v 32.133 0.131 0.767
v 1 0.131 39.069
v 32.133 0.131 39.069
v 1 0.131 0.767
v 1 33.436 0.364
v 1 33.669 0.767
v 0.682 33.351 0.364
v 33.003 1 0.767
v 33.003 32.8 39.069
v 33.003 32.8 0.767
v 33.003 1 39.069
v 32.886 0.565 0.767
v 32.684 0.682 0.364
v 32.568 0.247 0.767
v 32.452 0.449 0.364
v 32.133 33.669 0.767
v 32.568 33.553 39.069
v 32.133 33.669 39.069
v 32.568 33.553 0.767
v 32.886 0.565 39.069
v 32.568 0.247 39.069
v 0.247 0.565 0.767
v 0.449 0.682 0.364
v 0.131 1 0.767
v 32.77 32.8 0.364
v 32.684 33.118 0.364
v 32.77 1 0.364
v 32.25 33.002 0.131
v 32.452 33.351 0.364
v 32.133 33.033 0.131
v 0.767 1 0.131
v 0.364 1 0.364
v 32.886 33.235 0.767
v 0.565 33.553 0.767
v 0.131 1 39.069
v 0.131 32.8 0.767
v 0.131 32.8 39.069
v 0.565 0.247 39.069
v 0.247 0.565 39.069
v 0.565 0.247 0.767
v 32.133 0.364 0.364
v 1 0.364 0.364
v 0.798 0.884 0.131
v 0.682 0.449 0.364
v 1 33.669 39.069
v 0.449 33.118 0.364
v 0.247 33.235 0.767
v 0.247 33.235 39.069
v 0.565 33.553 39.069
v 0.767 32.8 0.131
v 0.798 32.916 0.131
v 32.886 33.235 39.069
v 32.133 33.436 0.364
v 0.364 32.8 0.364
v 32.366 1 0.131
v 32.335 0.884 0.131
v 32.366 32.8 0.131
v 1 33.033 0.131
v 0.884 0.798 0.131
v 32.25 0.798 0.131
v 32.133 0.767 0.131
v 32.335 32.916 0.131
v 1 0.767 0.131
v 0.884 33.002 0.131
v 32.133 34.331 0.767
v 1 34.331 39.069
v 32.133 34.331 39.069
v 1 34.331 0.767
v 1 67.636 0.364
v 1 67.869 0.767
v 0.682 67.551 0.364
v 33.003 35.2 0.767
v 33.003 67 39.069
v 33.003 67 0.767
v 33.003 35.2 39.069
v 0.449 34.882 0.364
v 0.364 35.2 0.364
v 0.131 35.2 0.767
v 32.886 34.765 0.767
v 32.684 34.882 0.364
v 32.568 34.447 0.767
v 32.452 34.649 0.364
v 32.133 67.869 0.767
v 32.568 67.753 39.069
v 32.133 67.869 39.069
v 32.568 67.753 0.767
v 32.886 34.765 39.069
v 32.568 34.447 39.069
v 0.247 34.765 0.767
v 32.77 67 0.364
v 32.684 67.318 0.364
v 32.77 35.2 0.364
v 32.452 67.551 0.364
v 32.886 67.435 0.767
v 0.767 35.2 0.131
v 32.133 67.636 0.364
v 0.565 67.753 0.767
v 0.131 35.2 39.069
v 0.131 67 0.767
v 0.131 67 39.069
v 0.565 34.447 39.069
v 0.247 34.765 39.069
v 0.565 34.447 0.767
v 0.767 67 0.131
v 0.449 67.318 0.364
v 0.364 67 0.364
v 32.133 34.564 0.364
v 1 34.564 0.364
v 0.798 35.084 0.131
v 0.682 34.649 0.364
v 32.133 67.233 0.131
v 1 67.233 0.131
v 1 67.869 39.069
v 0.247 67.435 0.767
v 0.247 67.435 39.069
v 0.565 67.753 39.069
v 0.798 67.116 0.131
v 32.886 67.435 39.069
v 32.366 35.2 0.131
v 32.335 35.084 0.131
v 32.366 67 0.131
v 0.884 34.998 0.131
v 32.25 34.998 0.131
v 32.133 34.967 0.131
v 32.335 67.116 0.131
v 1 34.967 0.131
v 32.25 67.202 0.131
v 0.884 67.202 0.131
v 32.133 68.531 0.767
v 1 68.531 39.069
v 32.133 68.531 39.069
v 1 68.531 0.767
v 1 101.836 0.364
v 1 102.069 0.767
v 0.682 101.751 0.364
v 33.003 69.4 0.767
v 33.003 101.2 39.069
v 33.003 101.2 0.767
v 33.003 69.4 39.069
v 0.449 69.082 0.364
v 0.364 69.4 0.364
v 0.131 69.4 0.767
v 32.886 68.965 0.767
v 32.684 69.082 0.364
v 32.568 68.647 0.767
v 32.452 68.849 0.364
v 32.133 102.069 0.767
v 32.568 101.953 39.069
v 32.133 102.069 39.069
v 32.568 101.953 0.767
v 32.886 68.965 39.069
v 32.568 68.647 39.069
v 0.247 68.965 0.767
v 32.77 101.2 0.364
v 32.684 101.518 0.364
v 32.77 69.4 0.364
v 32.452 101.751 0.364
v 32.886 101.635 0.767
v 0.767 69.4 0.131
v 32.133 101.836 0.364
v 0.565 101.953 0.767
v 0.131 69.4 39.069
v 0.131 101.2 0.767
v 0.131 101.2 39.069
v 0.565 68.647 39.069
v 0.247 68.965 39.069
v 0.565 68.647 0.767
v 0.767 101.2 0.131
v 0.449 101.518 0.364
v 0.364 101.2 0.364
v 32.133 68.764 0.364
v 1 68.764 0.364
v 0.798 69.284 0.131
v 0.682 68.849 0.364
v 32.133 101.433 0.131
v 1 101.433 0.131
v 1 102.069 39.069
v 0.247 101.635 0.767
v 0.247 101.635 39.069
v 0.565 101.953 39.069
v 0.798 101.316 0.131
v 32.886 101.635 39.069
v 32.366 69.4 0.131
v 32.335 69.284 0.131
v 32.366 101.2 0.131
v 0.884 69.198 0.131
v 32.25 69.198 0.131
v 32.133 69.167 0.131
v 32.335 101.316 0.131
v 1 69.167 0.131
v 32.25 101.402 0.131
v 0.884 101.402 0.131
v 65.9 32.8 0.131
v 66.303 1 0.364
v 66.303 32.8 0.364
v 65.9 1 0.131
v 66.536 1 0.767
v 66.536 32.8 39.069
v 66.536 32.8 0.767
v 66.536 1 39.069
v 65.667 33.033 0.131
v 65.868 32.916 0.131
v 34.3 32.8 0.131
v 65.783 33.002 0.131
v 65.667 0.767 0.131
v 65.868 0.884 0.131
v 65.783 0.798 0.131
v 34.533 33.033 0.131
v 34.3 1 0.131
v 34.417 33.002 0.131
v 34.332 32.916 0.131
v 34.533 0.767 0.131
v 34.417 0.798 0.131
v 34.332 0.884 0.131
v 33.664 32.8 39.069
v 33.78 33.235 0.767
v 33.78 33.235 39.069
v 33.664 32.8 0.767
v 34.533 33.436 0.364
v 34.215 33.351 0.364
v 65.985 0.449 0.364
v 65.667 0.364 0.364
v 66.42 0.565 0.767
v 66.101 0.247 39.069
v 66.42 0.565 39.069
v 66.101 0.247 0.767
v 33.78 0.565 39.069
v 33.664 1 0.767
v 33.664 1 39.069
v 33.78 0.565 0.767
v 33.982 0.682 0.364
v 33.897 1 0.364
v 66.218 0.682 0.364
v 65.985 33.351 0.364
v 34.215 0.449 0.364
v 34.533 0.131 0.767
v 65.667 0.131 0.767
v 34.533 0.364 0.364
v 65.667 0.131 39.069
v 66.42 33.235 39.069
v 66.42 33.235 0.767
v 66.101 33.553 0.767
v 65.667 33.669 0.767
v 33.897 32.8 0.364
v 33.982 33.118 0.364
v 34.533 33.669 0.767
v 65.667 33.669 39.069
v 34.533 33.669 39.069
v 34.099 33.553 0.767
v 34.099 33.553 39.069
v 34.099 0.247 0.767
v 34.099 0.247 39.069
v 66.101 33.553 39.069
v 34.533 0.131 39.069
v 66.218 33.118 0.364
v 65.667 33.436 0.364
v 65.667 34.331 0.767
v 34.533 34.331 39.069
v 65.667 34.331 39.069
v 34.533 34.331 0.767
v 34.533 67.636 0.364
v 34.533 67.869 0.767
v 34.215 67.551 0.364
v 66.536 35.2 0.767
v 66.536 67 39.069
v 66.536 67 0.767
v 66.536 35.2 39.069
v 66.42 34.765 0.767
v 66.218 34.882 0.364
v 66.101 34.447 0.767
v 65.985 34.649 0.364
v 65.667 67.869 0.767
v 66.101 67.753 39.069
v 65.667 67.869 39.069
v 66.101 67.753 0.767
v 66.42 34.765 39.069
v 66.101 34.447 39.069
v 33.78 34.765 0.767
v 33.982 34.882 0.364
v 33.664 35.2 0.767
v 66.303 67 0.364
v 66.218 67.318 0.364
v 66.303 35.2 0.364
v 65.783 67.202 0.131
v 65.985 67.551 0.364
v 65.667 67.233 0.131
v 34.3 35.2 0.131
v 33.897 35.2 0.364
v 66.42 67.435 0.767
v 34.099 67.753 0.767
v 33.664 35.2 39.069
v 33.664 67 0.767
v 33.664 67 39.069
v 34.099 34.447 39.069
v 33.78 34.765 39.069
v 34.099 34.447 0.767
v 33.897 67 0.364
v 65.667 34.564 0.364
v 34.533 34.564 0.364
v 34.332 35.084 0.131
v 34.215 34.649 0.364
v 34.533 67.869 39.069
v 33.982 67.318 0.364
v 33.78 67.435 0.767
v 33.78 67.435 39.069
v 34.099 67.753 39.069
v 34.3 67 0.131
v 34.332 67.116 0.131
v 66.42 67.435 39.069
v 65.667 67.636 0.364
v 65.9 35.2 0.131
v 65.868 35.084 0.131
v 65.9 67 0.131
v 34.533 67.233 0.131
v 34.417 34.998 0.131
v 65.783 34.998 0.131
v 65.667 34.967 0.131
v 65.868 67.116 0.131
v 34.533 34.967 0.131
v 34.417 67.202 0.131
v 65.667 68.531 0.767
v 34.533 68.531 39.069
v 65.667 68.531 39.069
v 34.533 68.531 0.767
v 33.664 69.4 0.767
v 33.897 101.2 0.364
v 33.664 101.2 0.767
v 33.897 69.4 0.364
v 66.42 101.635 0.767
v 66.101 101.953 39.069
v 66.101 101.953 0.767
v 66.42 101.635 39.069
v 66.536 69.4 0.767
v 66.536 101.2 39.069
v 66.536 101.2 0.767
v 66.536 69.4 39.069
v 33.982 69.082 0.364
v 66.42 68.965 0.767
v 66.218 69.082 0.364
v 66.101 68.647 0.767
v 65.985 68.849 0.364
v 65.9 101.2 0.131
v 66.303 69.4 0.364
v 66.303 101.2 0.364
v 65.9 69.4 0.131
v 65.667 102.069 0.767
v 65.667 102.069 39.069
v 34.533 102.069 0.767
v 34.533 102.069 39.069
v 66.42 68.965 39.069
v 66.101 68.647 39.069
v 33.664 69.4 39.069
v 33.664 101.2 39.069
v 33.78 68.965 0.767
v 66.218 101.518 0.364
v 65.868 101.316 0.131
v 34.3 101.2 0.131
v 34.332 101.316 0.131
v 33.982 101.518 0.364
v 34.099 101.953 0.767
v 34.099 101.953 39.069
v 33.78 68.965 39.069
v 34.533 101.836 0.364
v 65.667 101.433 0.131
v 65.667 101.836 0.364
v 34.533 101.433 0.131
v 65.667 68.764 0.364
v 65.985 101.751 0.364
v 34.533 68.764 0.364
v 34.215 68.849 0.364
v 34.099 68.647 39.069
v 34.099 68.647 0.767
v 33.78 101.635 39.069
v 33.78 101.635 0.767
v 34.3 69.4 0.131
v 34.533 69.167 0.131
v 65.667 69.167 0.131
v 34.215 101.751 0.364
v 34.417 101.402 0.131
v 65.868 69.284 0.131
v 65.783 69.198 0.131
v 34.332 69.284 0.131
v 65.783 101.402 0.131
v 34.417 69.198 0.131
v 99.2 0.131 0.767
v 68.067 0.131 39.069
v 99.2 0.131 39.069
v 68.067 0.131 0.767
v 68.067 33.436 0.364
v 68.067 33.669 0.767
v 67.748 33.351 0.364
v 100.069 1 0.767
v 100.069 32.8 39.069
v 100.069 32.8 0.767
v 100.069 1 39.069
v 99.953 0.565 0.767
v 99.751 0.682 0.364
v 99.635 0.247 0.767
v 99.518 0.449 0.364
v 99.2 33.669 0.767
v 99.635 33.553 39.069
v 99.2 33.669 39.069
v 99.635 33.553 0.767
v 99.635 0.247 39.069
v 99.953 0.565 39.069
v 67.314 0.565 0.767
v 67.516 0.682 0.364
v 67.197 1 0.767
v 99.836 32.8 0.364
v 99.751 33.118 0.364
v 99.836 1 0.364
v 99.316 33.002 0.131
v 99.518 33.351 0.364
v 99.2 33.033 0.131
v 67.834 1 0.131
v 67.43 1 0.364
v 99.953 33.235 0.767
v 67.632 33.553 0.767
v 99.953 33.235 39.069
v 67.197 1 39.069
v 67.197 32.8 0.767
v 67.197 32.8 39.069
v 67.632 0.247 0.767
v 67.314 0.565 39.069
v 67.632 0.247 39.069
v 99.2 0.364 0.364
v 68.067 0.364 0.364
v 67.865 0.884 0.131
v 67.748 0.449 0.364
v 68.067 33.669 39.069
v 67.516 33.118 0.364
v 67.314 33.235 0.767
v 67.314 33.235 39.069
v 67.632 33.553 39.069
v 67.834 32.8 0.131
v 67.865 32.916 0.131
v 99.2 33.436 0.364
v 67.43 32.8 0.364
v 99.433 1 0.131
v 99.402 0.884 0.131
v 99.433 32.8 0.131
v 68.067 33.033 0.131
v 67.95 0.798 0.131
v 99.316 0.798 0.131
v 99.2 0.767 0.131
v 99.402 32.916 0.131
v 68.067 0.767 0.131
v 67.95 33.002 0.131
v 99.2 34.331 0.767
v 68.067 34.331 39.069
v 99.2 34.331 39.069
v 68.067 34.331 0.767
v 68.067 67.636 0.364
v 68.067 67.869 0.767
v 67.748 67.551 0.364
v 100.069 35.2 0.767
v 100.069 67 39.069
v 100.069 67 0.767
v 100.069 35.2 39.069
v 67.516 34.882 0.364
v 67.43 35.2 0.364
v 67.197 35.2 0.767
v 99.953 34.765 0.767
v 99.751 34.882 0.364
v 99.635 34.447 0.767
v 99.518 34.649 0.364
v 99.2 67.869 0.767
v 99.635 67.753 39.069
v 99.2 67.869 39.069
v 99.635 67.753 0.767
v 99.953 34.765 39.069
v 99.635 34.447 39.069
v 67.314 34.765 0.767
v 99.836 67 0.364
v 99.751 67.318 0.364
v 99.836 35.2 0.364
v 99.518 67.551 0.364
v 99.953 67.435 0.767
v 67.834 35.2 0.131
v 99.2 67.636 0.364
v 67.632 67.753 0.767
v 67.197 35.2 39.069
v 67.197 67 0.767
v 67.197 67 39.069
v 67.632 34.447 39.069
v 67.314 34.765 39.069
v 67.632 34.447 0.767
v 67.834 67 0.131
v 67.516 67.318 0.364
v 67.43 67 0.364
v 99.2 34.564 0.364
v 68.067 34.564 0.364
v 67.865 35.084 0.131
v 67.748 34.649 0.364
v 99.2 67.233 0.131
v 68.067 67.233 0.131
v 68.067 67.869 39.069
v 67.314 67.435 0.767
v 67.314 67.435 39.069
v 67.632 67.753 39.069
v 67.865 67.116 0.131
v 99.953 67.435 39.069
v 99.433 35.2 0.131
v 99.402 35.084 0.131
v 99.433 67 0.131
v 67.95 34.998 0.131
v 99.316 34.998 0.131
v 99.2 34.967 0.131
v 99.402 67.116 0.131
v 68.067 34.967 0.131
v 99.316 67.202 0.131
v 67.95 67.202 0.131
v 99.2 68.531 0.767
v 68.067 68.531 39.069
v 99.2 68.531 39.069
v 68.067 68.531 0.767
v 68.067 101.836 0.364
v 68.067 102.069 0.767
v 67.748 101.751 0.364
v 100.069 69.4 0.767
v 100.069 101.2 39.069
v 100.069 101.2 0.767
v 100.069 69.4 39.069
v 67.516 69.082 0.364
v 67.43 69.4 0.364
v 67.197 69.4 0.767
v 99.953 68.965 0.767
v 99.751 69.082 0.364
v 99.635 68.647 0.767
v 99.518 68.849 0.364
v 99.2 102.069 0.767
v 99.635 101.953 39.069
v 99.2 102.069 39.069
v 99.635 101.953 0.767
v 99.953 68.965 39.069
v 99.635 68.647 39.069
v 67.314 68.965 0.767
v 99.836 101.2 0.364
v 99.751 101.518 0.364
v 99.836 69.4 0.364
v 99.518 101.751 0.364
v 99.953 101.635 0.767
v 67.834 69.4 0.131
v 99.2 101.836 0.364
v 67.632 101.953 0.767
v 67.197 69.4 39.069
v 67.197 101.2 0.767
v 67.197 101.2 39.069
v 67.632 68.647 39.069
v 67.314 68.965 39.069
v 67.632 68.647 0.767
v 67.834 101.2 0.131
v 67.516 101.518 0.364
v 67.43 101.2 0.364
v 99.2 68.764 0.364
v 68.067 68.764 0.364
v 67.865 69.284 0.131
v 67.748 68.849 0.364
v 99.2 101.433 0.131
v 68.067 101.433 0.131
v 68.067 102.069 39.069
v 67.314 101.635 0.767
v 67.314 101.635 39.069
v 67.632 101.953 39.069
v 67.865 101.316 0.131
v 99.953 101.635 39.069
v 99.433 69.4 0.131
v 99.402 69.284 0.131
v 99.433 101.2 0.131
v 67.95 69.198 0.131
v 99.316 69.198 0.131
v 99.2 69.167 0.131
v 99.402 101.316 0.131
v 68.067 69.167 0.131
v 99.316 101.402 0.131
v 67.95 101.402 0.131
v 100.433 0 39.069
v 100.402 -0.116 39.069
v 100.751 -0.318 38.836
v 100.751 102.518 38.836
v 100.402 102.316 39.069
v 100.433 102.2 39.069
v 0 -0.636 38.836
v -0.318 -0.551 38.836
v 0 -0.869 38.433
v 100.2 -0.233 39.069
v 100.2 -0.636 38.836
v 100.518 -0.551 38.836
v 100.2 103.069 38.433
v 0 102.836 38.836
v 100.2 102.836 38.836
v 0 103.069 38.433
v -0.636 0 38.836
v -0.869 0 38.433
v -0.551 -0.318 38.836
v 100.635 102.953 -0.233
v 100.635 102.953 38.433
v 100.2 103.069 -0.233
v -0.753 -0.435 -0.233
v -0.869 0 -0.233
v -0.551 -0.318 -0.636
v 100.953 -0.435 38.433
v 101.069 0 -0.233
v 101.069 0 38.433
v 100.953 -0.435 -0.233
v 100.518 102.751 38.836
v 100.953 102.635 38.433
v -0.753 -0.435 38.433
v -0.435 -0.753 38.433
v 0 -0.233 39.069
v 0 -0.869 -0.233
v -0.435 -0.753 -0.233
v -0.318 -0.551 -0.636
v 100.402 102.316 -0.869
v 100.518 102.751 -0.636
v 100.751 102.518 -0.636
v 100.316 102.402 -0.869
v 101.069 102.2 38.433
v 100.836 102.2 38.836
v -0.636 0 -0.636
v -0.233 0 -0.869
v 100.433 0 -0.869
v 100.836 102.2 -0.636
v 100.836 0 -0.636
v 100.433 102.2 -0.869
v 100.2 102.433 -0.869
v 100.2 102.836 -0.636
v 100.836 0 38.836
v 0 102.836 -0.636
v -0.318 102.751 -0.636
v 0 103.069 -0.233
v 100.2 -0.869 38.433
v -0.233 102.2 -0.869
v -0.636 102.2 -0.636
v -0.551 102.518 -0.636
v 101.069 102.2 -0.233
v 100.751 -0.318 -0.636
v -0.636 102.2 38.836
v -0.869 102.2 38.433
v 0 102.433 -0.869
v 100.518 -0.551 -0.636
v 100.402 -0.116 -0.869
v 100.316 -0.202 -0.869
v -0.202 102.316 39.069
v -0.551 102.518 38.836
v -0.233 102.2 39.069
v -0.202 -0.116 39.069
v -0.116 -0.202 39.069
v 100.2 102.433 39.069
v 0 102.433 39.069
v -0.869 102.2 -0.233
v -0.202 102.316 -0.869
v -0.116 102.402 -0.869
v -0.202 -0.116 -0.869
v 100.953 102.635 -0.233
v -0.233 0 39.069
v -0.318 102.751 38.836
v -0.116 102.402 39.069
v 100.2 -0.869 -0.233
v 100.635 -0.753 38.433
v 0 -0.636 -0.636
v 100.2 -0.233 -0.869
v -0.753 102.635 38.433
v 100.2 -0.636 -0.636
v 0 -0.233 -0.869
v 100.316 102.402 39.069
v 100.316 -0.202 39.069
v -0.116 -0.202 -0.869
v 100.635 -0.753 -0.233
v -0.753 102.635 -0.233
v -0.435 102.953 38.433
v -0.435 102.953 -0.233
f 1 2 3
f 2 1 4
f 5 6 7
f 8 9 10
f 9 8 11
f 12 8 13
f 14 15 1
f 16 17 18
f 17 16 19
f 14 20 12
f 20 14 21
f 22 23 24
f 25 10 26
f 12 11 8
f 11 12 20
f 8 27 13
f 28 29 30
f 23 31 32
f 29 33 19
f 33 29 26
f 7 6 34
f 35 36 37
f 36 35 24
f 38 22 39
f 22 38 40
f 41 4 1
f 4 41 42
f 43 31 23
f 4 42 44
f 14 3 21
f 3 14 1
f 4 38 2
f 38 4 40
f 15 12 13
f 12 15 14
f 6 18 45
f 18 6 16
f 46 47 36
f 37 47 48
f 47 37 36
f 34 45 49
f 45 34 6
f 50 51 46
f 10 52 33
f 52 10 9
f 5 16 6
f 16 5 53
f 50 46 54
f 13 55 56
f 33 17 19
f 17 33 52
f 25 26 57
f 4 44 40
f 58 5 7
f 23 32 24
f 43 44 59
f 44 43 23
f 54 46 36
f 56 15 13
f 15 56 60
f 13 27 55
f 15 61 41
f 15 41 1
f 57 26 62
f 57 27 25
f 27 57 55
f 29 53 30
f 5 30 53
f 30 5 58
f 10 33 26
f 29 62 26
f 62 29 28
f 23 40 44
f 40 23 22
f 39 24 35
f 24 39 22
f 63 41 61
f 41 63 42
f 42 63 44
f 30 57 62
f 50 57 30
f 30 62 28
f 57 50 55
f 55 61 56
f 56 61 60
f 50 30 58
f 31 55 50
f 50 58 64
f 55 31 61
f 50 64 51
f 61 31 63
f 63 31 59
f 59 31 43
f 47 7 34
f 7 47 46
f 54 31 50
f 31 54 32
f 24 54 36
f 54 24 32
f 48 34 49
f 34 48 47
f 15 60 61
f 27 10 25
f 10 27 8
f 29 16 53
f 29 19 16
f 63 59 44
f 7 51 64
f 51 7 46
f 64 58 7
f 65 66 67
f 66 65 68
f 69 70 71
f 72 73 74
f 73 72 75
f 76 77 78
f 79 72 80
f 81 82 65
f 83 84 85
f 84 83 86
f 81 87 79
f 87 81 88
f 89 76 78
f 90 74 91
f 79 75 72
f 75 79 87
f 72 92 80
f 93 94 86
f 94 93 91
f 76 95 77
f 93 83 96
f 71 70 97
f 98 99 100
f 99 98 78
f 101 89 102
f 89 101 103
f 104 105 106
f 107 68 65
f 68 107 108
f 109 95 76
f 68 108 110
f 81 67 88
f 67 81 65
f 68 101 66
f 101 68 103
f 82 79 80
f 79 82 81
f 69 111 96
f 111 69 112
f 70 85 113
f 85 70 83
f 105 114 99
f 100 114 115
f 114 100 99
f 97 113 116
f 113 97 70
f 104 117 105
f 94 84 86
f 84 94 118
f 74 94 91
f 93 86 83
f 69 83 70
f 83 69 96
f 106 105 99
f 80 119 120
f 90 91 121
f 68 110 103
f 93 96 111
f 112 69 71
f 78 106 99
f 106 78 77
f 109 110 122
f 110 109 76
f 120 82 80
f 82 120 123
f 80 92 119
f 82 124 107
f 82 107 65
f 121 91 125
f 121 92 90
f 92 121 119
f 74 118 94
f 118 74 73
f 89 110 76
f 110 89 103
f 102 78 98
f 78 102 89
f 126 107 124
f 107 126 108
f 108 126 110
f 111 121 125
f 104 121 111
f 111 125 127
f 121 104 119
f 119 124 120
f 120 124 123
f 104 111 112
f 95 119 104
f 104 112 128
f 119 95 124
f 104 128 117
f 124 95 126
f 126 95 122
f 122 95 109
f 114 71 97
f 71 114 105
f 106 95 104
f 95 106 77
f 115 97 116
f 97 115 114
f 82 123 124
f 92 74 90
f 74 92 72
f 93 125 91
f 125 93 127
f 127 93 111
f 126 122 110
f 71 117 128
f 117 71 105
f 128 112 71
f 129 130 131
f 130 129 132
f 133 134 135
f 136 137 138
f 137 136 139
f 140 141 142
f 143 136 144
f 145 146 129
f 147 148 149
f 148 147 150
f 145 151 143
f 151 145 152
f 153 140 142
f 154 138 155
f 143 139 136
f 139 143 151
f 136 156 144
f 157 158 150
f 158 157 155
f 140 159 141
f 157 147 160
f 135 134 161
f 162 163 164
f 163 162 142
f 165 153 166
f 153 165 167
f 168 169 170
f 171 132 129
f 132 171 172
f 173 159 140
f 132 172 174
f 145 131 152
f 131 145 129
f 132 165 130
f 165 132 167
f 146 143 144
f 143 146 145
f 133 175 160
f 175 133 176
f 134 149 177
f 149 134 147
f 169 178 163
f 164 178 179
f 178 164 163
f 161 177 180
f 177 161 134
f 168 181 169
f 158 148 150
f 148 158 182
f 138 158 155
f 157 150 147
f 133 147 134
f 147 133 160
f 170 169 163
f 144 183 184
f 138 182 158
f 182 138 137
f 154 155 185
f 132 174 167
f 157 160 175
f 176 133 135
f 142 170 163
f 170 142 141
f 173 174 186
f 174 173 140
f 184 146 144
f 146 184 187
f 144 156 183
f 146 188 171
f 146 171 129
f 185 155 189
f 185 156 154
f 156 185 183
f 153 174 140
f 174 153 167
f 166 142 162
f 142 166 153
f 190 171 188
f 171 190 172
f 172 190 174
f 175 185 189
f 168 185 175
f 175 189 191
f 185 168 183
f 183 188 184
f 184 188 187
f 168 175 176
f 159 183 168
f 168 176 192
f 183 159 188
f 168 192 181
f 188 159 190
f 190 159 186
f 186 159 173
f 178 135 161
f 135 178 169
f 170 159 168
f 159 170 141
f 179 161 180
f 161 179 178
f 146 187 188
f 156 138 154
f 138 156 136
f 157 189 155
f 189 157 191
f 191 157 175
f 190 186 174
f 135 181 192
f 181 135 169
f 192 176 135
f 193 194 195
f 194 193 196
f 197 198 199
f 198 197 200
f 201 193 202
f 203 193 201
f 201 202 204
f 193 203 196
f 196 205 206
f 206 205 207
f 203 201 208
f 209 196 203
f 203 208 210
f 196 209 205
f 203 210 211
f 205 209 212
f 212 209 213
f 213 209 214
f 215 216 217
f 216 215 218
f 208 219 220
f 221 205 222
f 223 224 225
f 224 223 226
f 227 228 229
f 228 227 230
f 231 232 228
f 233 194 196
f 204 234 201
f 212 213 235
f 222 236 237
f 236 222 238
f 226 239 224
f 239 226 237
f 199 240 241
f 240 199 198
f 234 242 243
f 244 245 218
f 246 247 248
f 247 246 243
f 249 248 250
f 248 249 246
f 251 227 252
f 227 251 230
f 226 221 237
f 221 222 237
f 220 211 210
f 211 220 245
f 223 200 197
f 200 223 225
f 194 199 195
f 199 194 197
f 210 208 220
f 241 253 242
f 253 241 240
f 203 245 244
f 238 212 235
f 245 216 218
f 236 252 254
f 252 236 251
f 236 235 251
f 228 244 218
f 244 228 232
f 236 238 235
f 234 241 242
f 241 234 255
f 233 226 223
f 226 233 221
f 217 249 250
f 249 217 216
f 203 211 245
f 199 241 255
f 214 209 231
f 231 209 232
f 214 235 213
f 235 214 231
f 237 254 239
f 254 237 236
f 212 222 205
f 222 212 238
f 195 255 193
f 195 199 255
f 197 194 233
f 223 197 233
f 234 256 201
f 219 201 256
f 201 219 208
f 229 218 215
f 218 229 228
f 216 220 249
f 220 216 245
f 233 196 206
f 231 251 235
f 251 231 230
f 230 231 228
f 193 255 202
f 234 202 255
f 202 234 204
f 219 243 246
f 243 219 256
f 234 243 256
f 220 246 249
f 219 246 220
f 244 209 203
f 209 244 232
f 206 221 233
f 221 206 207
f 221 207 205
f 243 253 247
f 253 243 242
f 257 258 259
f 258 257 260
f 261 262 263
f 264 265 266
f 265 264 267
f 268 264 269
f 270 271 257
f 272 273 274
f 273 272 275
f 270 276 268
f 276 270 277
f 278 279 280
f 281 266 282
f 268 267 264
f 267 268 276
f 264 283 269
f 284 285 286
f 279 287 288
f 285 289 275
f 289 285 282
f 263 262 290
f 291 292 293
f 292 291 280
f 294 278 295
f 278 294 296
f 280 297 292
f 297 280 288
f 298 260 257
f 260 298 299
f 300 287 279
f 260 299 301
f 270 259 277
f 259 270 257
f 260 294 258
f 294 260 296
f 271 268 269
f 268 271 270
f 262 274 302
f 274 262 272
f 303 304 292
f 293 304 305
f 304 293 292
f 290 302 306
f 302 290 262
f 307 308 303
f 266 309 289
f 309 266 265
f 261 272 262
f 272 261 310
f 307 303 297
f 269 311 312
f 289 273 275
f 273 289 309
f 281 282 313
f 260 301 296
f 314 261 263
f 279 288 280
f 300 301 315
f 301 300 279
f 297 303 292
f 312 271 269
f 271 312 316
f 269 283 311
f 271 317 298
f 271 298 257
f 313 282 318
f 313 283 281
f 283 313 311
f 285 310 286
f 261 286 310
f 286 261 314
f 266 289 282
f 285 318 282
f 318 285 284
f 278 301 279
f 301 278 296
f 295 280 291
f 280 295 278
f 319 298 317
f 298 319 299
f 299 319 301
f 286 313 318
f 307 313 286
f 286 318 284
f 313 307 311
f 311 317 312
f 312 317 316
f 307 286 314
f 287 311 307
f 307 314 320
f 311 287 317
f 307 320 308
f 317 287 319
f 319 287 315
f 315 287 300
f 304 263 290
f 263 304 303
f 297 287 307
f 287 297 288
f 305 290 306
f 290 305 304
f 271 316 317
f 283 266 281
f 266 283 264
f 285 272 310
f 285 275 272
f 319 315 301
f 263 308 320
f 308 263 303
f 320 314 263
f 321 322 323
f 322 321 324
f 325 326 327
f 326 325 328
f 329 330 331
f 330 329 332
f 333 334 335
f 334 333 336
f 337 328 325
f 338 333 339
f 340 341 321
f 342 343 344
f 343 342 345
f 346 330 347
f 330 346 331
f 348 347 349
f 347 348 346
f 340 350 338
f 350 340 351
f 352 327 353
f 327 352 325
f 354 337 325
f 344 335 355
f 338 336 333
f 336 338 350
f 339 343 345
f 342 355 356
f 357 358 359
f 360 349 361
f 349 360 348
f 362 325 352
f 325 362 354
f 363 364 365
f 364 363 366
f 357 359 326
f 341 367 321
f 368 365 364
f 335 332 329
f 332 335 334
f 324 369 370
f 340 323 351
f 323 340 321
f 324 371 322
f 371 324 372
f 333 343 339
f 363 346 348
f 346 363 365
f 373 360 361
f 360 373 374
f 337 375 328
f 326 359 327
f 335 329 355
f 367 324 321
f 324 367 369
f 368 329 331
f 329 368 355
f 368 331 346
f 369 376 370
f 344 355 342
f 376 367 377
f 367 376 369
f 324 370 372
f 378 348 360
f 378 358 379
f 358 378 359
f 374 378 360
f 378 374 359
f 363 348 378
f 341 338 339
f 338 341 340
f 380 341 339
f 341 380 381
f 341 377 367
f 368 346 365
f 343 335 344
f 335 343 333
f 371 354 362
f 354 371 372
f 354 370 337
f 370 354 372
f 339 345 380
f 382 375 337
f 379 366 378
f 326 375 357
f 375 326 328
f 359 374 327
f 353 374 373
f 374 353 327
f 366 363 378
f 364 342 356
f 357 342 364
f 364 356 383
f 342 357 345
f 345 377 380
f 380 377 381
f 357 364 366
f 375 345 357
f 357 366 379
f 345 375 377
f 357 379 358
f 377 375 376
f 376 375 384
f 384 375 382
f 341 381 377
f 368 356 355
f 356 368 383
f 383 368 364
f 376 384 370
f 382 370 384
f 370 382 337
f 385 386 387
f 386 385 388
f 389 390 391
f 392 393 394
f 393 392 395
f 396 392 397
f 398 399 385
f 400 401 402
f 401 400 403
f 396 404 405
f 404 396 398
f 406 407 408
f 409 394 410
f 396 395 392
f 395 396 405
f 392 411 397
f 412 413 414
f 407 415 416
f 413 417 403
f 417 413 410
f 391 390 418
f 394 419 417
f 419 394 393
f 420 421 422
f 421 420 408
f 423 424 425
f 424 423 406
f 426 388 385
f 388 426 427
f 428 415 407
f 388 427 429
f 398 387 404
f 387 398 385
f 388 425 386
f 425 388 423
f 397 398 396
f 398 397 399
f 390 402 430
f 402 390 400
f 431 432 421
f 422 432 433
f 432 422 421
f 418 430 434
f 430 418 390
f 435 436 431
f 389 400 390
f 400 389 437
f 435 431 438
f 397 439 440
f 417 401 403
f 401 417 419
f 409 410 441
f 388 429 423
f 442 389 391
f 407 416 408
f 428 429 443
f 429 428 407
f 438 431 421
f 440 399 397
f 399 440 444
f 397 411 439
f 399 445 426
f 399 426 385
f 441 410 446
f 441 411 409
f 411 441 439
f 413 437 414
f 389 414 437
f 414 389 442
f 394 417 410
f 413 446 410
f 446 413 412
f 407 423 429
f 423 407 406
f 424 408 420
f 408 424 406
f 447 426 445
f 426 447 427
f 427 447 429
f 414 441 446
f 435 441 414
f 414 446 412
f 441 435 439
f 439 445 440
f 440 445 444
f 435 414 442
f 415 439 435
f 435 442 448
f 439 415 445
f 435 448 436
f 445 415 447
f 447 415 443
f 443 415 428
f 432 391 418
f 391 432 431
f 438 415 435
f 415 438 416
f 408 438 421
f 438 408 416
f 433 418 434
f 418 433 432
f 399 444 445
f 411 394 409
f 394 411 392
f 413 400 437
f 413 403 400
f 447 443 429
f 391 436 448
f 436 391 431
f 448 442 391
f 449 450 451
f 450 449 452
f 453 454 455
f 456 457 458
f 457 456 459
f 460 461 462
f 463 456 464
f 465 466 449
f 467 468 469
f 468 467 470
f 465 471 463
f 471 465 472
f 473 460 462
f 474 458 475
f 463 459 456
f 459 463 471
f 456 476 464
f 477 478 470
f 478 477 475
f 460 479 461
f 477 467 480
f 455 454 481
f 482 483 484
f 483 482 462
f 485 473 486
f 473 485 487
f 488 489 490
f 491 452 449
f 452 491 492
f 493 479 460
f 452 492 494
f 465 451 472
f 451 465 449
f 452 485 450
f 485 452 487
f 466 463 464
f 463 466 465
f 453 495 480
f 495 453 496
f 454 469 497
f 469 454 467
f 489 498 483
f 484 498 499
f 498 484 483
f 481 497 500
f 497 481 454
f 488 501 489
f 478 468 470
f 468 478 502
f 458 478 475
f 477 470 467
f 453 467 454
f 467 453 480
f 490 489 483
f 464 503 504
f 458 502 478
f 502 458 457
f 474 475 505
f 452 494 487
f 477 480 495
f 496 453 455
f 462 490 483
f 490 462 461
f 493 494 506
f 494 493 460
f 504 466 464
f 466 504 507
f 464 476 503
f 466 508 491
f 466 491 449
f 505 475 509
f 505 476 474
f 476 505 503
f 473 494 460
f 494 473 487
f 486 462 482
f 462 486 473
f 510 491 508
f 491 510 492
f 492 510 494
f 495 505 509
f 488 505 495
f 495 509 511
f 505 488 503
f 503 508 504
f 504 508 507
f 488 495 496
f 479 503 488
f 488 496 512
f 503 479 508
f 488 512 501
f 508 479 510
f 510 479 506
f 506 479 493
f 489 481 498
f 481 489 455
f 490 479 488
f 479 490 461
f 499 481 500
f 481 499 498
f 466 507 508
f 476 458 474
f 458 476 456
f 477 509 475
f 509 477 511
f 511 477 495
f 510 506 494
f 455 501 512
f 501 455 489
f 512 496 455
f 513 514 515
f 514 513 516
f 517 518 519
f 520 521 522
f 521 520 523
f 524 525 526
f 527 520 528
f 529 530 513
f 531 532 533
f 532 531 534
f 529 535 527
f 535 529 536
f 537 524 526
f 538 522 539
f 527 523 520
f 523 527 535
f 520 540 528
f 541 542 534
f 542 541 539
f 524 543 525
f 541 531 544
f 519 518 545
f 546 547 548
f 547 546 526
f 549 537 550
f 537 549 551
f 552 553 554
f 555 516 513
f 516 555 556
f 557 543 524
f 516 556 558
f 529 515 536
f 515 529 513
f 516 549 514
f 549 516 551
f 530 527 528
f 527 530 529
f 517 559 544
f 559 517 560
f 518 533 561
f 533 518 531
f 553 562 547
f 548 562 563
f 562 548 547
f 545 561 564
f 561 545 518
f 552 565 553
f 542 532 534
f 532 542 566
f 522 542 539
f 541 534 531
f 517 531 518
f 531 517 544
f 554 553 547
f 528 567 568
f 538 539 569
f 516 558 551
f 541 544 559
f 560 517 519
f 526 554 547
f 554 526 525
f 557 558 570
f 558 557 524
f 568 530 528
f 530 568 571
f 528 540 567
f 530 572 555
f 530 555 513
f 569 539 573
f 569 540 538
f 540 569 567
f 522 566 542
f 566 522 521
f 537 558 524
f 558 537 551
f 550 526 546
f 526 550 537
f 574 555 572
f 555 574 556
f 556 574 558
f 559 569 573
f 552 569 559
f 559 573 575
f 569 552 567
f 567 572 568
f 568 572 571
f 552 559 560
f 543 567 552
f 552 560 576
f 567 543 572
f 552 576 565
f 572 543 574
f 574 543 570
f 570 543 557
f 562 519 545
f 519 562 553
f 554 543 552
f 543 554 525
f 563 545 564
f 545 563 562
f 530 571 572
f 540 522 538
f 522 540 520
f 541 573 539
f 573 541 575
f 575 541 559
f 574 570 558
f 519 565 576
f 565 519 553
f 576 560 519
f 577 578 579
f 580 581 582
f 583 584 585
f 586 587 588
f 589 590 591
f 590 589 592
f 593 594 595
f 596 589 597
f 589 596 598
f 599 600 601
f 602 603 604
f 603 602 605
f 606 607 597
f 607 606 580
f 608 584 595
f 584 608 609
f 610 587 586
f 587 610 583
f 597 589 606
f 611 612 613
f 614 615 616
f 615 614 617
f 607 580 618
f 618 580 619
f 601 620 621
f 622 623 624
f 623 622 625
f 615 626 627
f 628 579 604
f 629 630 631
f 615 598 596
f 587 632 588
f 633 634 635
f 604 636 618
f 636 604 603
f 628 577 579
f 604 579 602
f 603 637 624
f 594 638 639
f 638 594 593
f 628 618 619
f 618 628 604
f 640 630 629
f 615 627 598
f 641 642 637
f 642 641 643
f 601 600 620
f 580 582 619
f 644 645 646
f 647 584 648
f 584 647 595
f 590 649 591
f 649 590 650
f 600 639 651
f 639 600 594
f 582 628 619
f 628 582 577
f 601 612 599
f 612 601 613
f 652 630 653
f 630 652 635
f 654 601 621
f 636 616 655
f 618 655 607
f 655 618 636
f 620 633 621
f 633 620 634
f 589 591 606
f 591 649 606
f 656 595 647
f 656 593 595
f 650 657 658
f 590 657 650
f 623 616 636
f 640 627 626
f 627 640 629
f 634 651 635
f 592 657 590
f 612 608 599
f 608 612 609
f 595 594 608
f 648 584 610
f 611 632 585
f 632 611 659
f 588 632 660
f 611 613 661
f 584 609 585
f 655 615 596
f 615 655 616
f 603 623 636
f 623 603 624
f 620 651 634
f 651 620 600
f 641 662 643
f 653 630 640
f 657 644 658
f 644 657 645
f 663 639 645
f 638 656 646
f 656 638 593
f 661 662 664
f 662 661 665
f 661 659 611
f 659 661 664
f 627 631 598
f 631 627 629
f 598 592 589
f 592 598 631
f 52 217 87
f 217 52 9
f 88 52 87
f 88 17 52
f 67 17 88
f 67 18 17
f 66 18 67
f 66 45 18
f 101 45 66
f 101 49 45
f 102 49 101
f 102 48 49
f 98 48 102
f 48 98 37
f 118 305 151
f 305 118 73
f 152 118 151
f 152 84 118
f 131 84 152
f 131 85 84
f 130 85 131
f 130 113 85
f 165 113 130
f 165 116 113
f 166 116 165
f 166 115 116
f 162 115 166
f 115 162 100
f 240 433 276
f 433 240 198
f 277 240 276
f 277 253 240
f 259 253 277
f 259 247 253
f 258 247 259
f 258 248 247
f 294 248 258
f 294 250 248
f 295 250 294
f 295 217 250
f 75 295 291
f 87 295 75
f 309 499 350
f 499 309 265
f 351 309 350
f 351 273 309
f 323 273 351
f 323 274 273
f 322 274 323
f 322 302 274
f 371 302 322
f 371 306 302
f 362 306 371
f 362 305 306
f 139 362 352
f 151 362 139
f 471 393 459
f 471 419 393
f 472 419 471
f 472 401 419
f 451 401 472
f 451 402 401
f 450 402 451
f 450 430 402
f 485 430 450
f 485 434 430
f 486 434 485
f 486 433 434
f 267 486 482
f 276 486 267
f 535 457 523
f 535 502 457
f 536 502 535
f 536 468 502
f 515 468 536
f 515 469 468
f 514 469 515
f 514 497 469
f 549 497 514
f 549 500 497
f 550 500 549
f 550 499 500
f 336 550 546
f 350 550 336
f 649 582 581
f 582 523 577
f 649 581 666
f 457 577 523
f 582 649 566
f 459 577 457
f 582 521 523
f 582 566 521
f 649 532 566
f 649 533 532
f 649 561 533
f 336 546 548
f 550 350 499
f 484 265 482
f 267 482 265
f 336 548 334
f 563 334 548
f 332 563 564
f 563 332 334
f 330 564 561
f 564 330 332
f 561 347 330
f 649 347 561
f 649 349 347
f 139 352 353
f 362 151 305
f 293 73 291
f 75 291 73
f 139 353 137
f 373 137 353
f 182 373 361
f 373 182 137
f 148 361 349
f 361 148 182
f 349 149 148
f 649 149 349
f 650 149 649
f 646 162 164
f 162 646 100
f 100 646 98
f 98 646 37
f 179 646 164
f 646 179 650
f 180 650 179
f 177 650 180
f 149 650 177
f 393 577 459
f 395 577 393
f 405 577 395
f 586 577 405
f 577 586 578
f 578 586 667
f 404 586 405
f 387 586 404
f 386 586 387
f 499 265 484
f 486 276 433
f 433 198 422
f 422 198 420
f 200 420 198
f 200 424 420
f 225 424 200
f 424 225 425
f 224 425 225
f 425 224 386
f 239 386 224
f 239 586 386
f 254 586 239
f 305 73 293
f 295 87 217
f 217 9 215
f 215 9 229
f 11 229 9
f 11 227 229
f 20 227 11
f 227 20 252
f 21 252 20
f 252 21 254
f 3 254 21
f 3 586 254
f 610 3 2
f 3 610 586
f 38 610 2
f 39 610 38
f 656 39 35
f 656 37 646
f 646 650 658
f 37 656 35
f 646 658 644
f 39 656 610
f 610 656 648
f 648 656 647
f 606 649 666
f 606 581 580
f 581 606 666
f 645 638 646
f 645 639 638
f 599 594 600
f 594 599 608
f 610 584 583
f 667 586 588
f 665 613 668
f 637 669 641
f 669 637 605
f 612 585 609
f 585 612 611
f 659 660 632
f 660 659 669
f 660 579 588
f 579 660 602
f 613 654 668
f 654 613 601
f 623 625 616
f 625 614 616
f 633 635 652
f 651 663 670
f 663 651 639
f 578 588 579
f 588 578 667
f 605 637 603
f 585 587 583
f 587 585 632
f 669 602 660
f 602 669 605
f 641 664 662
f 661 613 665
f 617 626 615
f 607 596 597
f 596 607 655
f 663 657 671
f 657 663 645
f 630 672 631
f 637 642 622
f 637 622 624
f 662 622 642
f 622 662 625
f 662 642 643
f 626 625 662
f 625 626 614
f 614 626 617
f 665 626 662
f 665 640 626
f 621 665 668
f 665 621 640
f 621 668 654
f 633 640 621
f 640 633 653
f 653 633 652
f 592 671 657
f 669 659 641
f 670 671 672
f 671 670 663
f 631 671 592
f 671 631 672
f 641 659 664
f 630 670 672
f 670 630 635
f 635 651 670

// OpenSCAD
/////////////////Parameters
/* [Sizes] */
// total width
tw =102;
// total length
tl = 104;
// height
owh = 40;
// boxes in width direction
nw=3; // [1:10]
// boxes in length direction
nl=3; // [1:10]
// outer wall width
oww = 1;
// inner wall width 
iww = 0.6;
// edge radius
r = 0.9;
/* [Hidden] */
$fn=12;
//drawing

if (r<=0) {
	boxes(nw,nl,oww,iww,owh,(tw-2*oww+iww)/nw,(tl-2*oww+iww)/nl);
} else {
	rboxes(nw,nl,oww,iww,owh,(tw-2*oww+iww)/nw,(tl-2*oww+iww)/nl,r);
}

//////////////////Calculations + modules

module boxes(nbw,nbl,ow,iw,oh,boxw,boxl) {
	difference() {
		cube([nbw*boxw+ow+ow-iw,nbl*boxl+ow+ow-iw,oh]);
		for (i=[0:nbw-1])
			for (j=[0:nbl-1])
				translate([i*boxw+ow,j*boxl+ow,ow])
					cube([boxw-iw,boxl-iw,oh]);
	}
}

module rboxes(nbw,nbl,ow,iw,oh,boxw,boxl,r) {
	difference() {
		rcube(nbw*boxw+ow+ow-iw,nbl*boxl+ow+ow-iw,oh,r);
		for (i=[0:nbw-1])
			for (j=[0:nbl-1])
				translate([i*boxw+ow,j*boxl+ow,ow])
					rcube(boxw-iw,boxl-iw,oh,r);
	}
}

module rcube(w,l,h,r) {
	minkowski(){
		cube([w-2*r,l-2*r,h-2*r]);
		sphere(r);
	}	
}
